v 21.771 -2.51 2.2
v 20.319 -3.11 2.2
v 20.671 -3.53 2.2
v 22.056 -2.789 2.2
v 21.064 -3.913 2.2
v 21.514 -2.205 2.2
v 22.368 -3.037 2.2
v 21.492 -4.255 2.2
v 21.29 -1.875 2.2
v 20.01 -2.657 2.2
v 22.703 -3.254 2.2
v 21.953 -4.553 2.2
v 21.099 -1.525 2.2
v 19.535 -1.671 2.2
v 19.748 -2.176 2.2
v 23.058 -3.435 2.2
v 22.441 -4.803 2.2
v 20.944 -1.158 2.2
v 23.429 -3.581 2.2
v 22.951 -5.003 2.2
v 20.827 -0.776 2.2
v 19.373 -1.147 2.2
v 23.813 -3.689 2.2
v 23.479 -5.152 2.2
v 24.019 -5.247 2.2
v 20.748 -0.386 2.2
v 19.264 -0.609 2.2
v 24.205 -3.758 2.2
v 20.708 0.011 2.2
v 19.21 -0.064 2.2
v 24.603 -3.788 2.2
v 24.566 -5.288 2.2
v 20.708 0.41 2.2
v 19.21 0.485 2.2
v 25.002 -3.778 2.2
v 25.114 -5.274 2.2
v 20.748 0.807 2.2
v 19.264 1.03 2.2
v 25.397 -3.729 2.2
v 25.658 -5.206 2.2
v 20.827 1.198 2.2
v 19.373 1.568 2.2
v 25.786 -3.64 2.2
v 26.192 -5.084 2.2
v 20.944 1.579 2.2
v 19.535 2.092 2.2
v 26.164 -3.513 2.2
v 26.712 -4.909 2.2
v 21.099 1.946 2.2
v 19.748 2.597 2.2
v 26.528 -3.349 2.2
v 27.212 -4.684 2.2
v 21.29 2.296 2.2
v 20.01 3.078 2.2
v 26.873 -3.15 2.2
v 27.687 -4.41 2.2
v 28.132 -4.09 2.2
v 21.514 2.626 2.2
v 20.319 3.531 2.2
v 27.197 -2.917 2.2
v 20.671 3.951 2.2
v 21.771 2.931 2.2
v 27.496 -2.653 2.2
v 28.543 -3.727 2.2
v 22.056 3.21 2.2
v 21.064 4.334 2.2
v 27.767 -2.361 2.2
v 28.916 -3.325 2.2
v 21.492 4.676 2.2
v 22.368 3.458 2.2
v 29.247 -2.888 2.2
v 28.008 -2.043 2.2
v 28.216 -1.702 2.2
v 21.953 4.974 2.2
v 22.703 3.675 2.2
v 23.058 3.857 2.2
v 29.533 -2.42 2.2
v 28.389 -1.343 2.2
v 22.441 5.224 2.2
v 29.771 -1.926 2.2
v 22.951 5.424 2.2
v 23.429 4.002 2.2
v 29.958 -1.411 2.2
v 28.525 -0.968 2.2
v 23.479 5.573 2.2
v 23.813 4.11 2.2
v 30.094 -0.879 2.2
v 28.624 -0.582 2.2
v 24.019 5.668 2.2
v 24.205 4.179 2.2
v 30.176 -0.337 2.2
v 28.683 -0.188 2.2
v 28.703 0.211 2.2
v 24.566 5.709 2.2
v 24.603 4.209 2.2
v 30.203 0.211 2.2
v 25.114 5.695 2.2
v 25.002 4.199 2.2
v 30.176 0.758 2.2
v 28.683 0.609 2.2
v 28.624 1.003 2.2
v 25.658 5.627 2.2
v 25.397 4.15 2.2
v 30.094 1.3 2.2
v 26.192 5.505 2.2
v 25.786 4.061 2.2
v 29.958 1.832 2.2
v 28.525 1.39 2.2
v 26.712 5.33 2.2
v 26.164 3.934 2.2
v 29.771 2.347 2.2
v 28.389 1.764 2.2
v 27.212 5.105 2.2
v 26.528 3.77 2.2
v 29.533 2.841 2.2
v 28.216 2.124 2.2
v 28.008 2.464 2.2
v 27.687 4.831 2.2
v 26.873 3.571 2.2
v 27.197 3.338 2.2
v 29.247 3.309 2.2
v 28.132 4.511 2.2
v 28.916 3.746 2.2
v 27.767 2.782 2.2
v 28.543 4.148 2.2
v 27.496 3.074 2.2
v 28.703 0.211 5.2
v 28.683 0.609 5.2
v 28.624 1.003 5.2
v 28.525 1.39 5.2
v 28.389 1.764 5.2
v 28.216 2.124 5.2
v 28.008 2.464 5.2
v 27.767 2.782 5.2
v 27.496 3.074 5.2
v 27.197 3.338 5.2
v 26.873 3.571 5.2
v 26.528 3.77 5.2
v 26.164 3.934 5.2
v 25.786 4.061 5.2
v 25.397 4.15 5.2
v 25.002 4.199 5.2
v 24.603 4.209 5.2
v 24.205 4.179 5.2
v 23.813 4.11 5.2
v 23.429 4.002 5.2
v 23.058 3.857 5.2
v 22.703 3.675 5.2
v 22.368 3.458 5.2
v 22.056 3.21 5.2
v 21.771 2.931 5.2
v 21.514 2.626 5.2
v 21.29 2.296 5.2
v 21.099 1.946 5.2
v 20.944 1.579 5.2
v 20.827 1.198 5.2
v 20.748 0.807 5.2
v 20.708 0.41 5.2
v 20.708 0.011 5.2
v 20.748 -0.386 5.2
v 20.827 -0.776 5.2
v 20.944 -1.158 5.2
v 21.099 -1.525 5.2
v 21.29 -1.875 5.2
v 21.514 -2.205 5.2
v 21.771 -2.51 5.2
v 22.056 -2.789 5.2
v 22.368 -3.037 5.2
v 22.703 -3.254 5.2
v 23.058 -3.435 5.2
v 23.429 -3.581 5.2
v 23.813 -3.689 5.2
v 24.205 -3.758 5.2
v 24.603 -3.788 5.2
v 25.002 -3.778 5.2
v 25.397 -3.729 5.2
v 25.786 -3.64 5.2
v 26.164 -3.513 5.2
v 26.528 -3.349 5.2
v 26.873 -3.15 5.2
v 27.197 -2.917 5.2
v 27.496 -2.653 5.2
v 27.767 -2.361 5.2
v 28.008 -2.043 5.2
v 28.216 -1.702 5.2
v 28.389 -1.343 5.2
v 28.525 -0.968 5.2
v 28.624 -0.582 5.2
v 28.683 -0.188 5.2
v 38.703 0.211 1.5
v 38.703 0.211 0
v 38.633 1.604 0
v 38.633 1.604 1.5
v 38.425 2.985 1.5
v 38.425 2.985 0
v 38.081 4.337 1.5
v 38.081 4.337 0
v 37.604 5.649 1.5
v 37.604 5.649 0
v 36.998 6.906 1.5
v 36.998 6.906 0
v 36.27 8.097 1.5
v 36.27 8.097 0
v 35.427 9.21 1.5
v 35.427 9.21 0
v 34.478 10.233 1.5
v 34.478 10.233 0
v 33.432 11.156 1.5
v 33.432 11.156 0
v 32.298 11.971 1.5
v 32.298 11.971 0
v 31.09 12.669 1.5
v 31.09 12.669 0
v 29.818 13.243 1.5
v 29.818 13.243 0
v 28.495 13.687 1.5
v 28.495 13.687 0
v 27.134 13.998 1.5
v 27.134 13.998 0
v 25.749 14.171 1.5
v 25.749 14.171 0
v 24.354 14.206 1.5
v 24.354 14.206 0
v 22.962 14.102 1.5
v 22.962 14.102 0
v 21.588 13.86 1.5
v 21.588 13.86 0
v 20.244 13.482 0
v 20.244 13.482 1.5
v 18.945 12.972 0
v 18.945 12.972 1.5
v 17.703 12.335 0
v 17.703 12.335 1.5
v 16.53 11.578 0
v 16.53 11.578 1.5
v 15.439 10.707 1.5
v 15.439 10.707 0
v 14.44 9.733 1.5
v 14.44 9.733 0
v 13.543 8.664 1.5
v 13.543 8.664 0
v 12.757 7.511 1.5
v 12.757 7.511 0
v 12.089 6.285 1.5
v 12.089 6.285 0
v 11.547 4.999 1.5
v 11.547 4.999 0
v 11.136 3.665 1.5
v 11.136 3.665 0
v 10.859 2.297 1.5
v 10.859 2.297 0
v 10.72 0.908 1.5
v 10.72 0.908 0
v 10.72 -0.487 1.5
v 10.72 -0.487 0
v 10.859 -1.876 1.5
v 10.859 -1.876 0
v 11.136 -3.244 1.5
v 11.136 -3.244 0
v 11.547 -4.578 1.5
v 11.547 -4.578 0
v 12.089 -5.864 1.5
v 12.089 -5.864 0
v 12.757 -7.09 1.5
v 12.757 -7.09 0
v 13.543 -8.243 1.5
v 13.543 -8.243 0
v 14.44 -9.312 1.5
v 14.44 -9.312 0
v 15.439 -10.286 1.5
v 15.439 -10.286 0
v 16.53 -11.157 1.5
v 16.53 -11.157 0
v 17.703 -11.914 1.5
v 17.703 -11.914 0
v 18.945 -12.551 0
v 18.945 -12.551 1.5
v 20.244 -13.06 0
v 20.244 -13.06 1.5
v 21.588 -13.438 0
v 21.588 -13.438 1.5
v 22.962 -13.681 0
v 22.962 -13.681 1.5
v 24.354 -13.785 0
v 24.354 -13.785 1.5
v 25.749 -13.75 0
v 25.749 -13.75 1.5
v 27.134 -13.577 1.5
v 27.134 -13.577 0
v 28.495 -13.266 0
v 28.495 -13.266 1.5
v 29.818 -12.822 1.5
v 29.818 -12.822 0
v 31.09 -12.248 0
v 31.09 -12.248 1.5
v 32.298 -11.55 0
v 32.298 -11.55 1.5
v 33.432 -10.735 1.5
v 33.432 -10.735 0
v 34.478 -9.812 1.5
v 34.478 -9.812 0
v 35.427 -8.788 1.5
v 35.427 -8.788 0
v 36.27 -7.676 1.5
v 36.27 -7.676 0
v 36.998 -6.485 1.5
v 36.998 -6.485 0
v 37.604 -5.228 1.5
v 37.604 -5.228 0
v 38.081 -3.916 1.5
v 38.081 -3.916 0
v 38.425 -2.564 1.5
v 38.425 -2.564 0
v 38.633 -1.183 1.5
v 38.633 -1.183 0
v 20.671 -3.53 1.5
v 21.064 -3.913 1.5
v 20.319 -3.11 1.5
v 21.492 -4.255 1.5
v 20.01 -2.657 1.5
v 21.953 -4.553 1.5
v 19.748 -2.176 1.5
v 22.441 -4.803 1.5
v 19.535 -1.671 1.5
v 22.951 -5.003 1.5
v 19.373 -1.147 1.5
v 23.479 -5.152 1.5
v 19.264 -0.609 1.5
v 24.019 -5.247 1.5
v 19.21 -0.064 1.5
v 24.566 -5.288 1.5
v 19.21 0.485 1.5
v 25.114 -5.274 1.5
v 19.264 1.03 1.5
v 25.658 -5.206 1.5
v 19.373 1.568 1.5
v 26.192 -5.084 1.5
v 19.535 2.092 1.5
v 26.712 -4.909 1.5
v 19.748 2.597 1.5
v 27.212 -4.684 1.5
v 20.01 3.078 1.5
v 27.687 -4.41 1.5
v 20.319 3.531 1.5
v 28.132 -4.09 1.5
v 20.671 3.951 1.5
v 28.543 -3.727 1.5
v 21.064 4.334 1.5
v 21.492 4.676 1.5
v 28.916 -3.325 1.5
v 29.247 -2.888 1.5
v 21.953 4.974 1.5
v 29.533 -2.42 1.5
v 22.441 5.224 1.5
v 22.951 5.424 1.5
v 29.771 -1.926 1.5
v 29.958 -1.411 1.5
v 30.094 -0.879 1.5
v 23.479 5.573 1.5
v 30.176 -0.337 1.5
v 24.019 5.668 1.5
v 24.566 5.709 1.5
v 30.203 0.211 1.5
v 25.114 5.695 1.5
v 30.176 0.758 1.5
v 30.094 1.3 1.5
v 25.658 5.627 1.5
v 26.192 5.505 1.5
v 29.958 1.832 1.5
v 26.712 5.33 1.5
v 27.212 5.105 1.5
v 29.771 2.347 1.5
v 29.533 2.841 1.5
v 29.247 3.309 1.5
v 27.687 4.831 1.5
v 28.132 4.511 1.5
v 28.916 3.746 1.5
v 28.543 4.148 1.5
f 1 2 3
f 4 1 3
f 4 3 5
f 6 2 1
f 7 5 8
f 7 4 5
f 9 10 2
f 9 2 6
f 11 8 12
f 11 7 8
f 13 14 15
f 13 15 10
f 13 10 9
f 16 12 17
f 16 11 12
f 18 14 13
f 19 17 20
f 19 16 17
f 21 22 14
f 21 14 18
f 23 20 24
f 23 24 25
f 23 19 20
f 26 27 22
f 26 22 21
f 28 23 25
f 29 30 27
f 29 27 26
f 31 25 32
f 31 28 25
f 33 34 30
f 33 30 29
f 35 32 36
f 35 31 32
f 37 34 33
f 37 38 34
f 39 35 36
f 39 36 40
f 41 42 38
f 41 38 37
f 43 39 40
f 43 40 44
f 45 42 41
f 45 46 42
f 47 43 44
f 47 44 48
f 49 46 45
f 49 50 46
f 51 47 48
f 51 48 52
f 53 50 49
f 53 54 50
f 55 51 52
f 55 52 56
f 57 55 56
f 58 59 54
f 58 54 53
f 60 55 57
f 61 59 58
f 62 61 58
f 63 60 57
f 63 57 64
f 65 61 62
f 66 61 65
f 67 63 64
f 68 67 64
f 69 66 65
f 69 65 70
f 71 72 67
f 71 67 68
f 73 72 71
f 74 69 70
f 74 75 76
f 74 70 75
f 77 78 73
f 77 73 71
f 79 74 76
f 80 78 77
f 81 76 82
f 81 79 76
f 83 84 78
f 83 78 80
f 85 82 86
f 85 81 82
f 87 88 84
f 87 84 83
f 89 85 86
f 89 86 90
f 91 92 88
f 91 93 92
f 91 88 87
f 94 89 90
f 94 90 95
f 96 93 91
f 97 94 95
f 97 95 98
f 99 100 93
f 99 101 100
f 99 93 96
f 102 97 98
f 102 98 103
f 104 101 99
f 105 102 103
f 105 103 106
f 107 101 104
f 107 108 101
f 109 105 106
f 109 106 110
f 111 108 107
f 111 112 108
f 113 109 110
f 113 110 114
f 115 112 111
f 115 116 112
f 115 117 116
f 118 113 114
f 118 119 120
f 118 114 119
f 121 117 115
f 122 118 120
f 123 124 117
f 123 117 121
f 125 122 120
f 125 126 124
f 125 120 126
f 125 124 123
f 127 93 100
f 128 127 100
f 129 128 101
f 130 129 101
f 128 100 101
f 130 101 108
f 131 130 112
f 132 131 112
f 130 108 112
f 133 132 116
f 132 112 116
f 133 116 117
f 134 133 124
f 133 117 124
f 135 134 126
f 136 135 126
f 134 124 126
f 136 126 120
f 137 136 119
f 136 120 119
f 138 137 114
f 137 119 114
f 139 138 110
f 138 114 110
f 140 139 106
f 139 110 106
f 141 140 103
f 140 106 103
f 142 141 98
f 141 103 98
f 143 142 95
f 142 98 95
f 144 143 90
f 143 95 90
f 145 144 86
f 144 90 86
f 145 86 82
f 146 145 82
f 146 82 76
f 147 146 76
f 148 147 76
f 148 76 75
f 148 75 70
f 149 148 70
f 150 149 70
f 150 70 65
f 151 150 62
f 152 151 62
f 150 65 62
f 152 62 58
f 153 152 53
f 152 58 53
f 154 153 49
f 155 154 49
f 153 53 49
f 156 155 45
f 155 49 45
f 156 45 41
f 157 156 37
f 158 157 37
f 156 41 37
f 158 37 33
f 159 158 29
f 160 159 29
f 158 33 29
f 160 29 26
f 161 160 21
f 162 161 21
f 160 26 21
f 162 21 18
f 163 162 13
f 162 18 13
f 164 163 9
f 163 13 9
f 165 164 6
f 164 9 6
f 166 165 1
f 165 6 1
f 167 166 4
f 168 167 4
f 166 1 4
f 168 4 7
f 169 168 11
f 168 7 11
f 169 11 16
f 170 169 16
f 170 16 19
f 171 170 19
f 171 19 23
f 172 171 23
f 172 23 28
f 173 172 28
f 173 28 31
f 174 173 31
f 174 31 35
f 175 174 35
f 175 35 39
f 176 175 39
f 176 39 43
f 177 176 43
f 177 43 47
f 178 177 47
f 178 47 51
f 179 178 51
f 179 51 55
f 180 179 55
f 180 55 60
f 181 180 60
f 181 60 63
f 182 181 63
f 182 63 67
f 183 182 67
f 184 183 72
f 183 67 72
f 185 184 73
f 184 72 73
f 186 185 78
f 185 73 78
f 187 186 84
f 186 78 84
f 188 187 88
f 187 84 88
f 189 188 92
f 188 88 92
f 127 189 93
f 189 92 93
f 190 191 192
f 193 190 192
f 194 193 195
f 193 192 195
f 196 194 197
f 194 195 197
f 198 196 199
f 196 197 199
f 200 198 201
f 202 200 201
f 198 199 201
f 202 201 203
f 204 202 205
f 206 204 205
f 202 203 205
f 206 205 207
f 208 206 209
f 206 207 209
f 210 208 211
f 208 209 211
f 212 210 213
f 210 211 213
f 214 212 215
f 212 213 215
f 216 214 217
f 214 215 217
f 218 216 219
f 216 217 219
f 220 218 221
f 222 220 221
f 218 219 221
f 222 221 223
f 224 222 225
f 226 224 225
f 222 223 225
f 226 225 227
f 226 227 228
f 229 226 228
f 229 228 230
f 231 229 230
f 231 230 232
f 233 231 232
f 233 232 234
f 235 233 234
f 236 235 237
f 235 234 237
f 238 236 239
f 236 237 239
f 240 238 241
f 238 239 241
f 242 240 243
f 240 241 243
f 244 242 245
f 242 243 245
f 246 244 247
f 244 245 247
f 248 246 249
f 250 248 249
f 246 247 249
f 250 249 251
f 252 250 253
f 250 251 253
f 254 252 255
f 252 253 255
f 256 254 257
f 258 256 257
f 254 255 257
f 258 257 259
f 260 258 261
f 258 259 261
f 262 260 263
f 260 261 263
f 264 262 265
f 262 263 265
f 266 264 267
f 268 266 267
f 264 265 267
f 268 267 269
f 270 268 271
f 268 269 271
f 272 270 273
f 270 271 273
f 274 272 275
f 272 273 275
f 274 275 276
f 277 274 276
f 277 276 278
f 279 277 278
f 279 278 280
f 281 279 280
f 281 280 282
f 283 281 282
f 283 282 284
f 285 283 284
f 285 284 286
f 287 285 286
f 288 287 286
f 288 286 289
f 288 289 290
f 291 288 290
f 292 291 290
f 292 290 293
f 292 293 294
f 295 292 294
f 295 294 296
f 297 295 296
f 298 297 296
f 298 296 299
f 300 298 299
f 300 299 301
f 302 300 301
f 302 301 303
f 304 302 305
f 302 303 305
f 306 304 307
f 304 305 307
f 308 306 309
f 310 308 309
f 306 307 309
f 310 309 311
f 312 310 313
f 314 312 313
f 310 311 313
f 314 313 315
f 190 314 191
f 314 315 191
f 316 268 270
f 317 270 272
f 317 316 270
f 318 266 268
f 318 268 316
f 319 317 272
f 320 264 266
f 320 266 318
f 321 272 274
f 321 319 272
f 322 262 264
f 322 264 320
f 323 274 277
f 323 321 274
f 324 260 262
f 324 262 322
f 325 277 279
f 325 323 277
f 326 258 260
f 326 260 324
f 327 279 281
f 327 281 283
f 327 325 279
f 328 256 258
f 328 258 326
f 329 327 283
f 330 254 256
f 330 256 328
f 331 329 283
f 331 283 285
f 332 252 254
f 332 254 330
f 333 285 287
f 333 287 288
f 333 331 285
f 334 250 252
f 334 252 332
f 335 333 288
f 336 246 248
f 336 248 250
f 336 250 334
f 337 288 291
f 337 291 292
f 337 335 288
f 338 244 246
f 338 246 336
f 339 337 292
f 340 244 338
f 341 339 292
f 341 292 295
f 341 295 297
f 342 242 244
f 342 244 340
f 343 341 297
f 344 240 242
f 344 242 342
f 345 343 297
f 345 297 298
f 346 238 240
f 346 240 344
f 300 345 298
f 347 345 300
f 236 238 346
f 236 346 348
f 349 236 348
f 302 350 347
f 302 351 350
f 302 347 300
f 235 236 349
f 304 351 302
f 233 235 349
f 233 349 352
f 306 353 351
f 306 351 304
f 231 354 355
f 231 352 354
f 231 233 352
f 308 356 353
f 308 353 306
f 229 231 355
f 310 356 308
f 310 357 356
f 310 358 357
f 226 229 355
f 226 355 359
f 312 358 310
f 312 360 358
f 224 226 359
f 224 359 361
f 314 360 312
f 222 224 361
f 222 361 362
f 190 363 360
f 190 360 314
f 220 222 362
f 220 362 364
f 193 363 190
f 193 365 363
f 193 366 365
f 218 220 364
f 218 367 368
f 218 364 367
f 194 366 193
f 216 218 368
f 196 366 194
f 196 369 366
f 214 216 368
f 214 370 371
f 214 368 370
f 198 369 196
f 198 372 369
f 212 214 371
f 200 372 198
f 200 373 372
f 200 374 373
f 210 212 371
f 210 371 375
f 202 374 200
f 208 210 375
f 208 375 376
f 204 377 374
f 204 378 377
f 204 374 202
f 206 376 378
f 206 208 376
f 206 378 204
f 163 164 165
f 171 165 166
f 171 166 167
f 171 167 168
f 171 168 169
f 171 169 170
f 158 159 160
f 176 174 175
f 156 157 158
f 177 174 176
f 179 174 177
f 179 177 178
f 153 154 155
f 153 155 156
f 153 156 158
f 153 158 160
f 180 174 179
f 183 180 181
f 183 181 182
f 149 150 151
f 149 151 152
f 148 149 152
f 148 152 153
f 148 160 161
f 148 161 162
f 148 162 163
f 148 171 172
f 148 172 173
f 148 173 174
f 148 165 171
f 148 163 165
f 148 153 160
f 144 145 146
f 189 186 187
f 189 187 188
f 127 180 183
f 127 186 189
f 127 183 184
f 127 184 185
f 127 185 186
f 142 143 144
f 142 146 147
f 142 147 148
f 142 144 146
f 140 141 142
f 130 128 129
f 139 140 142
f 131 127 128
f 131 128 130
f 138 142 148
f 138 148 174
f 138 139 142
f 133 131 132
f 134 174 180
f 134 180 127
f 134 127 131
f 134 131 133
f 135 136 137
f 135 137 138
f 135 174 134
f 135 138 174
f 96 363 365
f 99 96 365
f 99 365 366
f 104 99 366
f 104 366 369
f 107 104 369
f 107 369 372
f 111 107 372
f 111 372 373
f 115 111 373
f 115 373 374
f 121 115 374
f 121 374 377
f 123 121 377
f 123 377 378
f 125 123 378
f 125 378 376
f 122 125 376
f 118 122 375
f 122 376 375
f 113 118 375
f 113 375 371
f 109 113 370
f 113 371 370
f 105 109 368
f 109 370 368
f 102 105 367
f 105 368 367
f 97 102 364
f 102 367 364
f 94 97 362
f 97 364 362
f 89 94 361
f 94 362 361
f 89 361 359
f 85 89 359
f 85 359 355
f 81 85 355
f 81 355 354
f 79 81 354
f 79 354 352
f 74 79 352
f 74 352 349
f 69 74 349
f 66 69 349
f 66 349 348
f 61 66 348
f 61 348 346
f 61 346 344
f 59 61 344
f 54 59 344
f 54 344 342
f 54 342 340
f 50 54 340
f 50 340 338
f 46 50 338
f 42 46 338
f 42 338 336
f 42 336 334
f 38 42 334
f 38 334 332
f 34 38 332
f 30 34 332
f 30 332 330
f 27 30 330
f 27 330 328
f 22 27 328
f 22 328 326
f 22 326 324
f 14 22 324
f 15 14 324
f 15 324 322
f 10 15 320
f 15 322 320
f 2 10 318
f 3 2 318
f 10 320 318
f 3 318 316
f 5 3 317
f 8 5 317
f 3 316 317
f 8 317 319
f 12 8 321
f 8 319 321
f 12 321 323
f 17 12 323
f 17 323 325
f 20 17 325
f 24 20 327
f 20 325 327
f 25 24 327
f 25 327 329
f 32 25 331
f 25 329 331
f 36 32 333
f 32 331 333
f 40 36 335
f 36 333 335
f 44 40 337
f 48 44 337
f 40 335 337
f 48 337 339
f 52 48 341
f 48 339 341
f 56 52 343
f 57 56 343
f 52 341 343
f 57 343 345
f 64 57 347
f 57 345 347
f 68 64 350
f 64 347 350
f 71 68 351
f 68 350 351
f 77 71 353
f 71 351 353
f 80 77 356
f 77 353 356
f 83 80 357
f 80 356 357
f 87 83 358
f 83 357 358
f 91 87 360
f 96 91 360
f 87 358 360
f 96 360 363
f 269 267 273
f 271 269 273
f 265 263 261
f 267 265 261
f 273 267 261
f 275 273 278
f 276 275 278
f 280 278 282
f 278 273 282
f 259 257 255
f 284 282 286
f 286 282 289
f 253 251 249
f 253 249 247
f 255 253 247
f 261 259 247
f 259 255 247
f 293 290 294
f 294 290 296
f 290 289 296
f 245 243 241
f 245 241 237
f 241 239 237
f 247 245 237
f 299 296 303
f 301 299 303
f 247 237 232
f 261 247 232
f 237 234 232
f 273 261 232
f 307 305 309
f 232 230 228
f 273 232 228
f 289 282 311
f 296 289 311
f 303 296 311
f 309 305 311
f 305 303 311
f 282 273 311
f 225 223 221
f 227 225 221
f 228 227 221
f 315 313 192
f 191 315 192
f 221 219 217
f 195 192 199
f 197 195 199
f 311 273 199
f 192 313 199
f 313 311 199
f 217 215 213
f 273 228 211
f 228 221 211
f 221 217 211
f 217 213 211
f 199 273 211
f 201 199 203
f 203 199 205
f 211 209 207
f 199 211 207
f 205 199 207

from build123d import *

# Parameters (mm, degrees)
F0_R     = 14
F0_R_2   = 5.5
F1_DEPTH = 1.5
F0_R_3   = 4
F2_DEPTH = 2.2
F3_DEPTH = 2.2
F4_R     = 4
F5_DEPTH = 3


with BuildPart() as f1:
    # F0 (on Top) → F1 (new body)
    with BuildSketch(Plane.XY):
        with Locations((24.702849, 0.210536)):
            Circle(F0_R)
        with Locations((24.702849, 0.210536)):
            Circle(F0_R_2, mode=Mode.SUBTRACT)
    extrude(amount=F1_DEPTH)

    # F0 (on Top) → F2 (join)
    with BuildSketch(Plane.XY):
        with Locations((24.702849, 0.210536)):
            Circle(F0_R_2)
        with Locations((24.702849, 0.210536)):
            Circle(F0_R_3, mode=Mode.SUBTRACT)
    extrude(amount=F2_DEPTH)

    # F0 (on Top) → F3 (join)
    with BuildSketch(Plane.XY):
        with Locations((24.702849, 0.210536)):
            Circle(F0_R_3)
    extrude(amount=F3_DEPTH)

    # F4 (on face) → F5 (join)
    with BuildSketch(Plane.XY.offset(2.2)):
        with Locations((24.702849, 0.210536)):
            Circle(F4_R)
    extrude(amount=F5_DEPTH)


solid = f1.part
